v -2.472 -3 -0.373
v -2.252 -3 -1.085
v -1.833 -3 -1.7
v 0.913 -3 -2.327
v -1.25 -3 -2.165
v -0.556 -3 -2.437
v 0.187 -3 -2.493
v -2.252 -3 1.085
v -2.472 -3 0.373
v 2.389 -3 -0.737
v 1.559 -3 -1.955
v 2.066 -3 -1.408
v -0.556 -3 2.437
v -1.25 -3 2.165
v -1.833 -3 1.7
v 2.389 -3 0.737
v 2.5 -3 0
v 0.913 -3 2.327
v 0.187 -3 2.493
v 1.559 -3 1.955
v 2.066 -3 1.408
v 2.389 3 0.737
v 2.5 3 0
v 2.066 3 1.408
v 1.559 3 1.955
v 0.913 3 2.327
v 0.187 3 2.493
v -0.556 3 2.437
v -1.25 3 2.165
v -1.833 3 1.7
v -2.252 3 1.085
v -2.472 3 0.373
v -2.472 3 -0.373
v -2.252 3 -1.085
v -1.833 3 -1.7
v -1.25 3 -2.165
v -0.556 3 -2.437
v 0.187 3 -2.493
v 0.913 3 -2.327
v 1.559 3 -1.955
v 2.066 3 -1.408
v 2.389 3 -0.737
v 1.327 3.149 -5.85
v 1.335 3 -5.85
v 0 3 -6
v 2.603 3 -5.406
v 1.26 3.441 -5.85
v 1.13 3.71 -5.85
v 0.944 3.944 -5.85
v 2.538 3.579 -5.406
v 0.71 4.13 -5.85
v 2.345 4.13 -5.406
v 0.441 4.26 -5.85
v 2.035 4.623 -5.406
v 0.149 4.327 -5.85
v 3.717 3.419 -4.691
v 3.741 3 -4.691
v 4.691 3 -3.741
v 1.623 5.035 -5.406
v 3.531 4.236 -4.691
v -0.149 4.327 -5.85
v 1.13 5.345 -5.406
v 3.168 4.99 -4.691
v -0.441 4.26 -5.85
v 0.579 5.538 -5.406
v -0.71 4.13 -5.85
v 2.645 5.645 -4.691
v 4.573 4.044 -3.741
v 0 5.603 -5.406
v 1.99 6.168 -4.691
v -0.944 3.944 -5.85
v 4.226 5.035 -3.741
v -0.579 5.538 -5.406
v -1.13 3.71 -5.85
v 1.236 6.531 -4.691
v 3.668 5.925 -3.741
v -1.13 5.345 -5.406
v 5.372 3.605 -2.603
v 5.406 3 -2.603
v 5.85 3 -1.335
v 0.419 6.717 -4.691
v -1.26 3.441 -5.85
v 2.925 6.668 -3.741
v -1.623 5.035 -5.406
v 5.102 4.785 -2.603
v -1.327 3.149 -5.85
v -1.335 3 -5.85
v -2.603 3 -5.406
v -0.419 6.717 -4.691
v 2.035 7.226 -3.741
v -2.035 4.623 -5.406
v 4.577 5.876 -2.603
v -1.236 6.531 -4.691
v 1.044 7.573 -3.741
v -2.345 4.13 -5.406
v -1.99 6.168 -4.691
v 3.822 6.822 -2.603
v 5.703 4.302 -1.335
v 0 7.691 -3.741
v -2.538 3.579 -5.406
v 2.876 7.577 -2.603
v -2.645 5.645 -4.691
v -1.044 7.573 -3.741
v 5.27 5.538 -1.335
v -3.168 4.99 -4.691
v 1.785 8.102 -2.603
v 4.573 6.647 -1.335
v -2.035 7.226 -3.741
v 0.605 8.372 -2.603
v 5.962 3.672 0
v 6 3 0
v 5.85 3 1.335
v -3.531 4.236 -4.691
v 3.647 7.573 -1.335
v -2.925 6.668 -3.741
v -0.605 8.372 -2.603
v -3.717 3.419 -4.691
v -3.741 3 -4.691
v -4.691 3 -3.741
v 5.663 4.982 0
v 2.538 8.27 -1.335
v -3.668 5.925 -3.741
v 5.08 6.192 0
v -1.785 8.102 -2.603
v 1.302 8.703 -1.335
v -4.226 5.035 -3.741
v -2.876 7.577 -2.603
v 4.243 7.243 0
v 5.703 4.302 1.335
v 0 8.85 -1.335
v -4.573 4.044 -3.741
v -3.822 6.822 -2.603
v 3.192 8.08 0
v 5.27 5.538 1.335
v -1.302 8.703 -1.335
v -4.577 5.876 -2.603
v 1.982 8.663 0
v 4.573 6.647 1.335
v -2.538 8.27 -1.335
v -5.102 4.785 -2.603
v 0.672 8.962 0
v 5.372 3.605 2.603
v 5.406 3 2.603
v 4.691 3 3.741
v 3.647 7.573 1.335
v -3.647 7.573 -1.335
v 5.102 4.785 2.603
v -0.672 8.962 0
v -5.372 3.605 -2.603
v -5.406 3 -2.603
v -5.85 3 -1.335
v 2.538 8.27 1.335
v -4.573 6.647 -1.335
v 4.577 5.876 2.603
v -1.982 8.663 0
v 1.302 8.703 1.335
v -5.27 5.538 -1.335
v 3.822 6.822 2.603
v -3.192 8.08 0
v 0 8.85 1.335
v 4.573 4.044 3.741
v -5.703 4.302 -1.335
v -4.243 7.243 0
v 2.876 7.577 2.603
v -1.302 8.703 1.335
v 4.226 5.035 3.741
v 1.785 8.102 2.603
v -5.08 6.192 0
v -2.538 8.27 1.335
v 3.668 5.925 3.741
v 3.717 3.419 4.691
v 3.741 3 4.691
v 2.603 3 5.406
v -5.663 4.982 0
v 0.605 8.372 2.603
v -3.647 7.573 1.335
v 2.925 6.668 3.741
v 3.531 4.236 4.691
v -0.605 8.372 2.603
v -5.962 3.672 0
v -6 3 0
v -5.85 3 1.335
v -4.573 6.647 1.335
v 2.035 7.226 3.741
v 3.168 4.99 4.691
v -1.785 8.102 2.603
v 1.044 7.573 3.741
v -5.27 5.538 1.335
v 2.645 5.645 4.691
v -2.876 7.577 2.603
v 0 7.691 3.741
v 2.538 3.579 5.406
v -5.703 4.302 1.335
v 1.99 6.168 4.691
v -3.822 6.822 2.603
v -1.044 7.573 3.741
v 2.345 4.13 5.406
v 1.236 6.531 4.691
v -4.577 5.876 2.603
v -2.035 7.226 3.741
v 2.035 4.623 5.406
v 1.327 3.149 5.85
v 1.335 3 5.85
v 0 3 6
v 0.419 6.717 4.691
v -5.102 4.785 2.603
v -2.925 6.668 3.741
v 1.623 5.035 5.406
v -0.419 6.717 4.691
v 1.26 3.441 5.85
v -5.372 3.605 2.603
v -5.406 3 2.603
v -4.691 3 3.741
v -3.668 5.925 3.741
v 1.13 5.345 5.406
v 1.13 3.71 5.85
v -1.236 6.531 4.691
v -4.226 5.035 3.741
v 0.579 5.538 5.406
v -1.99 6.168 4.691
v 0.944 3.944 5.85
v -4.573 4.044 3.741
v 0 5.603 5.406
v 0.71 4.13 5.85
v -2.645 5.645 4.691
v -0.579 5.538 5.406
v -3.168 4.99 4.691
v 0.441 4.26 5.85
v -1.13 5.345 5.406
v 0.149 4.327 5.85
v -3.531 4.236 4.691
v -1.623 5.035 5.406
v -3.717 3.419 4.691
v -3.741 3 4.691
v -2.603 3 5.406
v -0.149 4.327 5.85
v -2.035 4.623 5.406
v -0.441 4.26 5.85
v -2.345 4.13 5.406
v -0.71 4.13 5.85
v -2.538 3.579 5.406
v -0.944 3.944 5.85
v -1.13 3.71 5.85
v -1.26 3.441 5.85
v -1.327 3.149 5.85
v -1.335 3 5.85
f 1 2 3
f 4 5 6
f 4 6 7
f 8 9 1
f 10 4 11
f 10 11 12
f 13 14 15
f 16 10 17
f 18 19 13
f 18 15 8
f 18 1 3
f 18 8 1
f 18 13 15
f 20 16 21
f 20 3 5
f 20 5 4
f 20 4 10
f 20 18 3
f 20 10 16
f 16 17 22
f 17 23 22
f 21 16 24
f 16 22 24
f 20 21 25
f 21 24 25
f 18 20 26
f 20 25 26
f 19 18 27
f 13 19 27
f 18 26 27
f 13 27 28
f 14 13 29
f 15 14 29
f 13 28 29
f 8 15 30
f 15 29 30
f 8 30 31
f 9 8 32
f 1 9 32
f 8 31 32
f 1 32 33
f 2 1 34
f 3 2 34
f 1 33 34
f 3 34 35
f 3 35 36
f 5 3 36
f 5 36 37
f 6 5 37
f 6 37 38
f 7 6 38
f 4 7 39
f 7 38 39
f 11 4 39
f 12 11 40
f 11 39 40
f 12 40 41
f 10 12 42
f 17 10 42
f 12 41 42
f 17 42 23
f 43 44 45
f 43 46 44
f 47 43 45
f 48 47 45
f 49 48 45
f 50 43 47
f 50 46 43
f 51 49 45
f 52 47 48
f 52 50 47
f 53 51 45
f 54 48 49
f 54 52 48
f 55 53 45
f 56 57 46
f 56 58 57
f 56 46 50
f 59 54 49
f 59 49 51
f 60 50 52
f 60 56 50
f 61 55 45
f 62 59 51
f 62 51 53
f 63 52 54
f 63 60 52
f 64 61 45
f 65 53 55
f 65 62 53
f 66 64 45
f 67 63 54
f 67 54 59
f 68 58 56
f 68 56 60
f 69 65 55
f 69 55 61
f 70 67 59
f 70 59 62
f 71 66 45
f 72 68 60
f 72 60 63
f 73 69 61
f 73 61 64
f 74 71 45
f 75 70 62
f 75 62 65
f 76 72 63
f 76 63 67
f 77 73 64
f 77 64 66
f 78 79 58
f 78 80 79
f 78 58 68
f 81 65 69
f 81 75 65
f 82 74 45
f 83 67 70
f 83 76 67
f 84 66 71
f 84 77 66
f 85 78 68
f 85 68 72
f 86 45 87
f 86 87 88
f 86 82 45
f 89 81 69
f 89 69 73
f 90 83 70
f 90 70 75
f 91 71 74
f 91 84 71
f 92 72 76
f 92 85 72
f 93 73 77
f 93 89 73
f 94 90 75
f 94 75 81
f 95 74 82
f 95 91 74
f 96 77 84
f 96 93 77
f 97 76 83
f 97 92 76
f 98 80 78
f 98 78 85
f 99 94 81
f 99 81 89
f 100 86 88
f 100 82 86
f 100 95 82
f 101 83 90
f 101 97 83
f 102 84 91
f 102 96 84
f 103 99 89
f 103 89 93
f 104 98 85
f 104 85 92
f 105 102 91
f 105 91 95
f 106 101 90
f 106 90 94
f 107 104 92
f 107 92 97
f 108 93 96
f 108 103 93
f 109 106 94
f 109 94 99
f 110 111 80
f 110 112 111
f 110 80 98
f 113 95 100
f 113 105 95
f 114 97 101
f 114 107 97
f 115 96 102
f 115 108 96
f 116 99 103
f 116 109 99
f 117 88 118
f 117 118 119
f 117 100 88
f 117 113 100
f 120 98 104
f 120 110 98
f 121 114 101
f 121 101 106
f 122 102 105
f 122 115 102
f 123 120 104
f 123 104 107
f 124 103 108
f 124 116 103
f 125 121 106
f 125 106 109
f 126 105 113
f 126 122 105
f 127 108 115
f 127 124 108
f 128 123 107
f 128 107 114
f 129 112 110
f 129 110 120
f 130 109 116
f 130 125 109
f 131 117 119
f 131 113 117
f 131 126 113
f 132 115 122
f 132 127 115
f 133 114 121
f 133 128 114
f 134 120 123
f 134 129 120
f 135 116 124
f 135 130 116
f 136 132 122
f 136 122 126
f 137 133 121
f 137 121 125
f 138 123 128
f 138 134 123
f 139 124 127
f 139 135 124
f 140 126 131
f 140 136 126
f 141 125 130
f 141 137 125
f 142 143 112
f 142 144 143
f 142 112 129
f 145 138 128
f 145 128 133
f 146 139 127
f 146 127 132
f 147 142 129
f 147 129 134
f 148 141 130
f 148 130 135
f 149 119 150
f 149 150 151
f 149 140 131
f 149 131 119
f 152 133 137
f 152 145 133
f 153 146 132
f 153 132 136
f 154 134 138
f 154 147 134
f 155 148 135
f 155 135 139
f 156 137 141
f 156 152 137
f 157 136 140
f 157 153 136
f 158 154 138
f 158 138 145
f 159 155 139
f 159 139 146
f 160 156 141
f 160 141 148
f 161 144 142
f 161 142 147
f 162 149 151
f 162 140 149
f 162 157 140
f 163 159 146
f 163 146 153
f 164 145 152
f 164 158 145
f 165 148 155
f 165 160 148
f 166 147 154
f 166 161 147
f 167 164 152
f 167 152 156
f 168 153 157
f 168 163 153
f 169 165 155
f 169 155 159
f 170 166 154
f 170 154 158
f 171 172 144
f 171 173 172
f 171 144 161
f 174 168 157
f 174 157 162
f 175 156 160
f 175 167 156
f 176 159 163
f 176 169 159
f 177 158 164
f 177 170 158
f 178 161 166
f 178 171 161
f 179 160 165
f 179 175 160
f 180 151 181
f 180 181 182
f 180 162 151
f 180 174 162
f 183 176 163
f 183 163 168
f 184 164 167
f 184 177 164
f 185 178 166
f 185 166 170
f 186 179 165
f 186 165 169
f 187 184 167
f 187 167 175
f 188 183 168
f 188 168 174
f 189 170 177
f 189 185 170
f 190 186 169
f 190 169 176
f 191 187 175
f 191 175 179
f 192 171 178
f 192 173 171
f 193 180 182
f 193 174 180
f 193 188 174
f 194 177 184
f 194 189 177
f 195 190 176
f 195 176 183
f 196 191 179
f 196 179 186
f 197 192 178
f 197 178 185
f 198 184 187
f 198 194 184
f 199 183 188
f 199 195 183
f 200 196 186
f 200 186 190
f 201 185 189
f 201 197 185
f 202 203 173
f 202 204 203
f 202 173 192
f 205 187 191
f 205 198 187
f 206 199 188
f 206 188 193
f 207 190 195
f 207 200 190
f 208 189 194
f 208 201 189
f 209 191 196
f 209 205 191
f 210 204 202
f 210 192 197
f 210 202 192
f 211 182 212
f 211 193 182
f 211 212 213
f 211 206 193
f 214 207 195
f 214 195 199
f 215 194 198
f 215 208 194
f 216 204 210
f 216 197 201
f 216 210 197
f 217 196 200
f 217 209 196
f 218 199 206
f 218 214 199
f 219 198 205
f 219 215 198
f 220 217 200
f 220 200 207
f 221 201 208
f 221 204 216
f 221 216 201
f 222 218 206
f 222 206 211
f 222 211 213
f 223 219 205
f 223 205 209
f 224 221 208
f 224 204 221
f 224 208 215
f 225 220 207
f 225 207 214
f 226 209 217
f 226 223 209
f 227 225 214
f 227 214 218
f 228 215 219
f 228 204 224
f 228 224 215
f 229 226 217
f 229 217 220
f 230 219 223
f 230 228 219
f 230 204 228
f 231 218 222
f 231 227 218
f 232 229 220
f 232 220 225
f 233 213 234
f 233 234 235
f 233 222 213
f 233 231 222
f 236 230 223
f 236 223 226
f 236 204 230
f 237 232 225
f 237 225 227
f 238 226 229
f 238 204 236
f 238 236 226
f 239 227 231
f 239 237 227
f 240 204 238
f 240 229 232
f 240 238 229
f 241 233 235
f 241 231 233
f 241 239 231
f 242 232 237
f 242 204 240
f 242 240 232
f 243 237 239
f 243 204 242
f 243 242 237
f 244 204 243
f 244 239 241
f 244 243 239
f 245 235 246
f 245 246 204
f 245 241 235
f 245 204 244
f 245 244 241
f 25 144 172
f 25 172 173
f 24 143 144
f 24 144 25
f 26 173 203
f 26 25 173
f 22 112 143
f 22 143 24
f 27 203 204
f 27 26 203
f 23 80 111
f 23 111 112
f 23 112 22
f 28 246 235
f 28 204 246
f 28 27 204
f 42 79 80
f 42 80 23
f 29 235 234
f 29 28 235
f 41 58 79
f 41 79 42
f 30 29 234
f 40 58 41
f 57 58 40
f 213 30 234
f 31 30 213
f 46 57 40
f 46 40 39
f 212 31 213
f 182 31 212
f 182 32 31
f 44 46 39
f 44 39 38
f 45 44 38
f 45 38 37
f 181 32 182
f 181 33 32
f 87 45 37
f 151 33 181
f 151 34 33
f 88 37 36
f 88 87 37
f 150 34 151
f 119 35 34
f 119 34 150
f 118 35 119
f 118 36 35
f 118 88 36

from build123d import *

# Parameters (mm, degrees)
SKETCH1_R           = 2.5
BOSS_EXTRUDE1_DEPTH = 3
REVOLVE1_ANGLE      = 180
SKETCH3_R           = 2.5
BOSS_EXTRUDE2_DEPTH = 3


with BuildPart() as part:
    # Sketch1 → Boss-Extrude1 (new body)
    with BuildSketch(Plane(origin=(0, 0, 0), x_dir=(1, 0, 0), z_dir=(0, 1, 0))):
        Circle(SKETCH1_R)
    extrude(amount=BOSS_EXTRUDE1_DEPTH)

    # Sketch2 → Revolve1 (revolve)
    with BuildSketch(Plane(origin=(0, 3, 0), x_dir=(1, 0, 0), z_dir=(0, 1, 0))):
        with BuildLine():
            Line((0, -6), (0, 6))
            ThreePointArc((0, 6), (6, 0), (0, -6))
        make_face()
    revolve(axis=Axis((0, 3, 6), (0, 0, 1)), revolution_arc=REVOLVE1_ANGLE)

    # Sketch3 → Boss-Extrude2 (add)
    with BuildSketch(Plane.XZ):
        Circle(SKETCH3_R)
    extrude(amount=BOSS_EXTRUDE2_DEPTH)


solid = part.part
